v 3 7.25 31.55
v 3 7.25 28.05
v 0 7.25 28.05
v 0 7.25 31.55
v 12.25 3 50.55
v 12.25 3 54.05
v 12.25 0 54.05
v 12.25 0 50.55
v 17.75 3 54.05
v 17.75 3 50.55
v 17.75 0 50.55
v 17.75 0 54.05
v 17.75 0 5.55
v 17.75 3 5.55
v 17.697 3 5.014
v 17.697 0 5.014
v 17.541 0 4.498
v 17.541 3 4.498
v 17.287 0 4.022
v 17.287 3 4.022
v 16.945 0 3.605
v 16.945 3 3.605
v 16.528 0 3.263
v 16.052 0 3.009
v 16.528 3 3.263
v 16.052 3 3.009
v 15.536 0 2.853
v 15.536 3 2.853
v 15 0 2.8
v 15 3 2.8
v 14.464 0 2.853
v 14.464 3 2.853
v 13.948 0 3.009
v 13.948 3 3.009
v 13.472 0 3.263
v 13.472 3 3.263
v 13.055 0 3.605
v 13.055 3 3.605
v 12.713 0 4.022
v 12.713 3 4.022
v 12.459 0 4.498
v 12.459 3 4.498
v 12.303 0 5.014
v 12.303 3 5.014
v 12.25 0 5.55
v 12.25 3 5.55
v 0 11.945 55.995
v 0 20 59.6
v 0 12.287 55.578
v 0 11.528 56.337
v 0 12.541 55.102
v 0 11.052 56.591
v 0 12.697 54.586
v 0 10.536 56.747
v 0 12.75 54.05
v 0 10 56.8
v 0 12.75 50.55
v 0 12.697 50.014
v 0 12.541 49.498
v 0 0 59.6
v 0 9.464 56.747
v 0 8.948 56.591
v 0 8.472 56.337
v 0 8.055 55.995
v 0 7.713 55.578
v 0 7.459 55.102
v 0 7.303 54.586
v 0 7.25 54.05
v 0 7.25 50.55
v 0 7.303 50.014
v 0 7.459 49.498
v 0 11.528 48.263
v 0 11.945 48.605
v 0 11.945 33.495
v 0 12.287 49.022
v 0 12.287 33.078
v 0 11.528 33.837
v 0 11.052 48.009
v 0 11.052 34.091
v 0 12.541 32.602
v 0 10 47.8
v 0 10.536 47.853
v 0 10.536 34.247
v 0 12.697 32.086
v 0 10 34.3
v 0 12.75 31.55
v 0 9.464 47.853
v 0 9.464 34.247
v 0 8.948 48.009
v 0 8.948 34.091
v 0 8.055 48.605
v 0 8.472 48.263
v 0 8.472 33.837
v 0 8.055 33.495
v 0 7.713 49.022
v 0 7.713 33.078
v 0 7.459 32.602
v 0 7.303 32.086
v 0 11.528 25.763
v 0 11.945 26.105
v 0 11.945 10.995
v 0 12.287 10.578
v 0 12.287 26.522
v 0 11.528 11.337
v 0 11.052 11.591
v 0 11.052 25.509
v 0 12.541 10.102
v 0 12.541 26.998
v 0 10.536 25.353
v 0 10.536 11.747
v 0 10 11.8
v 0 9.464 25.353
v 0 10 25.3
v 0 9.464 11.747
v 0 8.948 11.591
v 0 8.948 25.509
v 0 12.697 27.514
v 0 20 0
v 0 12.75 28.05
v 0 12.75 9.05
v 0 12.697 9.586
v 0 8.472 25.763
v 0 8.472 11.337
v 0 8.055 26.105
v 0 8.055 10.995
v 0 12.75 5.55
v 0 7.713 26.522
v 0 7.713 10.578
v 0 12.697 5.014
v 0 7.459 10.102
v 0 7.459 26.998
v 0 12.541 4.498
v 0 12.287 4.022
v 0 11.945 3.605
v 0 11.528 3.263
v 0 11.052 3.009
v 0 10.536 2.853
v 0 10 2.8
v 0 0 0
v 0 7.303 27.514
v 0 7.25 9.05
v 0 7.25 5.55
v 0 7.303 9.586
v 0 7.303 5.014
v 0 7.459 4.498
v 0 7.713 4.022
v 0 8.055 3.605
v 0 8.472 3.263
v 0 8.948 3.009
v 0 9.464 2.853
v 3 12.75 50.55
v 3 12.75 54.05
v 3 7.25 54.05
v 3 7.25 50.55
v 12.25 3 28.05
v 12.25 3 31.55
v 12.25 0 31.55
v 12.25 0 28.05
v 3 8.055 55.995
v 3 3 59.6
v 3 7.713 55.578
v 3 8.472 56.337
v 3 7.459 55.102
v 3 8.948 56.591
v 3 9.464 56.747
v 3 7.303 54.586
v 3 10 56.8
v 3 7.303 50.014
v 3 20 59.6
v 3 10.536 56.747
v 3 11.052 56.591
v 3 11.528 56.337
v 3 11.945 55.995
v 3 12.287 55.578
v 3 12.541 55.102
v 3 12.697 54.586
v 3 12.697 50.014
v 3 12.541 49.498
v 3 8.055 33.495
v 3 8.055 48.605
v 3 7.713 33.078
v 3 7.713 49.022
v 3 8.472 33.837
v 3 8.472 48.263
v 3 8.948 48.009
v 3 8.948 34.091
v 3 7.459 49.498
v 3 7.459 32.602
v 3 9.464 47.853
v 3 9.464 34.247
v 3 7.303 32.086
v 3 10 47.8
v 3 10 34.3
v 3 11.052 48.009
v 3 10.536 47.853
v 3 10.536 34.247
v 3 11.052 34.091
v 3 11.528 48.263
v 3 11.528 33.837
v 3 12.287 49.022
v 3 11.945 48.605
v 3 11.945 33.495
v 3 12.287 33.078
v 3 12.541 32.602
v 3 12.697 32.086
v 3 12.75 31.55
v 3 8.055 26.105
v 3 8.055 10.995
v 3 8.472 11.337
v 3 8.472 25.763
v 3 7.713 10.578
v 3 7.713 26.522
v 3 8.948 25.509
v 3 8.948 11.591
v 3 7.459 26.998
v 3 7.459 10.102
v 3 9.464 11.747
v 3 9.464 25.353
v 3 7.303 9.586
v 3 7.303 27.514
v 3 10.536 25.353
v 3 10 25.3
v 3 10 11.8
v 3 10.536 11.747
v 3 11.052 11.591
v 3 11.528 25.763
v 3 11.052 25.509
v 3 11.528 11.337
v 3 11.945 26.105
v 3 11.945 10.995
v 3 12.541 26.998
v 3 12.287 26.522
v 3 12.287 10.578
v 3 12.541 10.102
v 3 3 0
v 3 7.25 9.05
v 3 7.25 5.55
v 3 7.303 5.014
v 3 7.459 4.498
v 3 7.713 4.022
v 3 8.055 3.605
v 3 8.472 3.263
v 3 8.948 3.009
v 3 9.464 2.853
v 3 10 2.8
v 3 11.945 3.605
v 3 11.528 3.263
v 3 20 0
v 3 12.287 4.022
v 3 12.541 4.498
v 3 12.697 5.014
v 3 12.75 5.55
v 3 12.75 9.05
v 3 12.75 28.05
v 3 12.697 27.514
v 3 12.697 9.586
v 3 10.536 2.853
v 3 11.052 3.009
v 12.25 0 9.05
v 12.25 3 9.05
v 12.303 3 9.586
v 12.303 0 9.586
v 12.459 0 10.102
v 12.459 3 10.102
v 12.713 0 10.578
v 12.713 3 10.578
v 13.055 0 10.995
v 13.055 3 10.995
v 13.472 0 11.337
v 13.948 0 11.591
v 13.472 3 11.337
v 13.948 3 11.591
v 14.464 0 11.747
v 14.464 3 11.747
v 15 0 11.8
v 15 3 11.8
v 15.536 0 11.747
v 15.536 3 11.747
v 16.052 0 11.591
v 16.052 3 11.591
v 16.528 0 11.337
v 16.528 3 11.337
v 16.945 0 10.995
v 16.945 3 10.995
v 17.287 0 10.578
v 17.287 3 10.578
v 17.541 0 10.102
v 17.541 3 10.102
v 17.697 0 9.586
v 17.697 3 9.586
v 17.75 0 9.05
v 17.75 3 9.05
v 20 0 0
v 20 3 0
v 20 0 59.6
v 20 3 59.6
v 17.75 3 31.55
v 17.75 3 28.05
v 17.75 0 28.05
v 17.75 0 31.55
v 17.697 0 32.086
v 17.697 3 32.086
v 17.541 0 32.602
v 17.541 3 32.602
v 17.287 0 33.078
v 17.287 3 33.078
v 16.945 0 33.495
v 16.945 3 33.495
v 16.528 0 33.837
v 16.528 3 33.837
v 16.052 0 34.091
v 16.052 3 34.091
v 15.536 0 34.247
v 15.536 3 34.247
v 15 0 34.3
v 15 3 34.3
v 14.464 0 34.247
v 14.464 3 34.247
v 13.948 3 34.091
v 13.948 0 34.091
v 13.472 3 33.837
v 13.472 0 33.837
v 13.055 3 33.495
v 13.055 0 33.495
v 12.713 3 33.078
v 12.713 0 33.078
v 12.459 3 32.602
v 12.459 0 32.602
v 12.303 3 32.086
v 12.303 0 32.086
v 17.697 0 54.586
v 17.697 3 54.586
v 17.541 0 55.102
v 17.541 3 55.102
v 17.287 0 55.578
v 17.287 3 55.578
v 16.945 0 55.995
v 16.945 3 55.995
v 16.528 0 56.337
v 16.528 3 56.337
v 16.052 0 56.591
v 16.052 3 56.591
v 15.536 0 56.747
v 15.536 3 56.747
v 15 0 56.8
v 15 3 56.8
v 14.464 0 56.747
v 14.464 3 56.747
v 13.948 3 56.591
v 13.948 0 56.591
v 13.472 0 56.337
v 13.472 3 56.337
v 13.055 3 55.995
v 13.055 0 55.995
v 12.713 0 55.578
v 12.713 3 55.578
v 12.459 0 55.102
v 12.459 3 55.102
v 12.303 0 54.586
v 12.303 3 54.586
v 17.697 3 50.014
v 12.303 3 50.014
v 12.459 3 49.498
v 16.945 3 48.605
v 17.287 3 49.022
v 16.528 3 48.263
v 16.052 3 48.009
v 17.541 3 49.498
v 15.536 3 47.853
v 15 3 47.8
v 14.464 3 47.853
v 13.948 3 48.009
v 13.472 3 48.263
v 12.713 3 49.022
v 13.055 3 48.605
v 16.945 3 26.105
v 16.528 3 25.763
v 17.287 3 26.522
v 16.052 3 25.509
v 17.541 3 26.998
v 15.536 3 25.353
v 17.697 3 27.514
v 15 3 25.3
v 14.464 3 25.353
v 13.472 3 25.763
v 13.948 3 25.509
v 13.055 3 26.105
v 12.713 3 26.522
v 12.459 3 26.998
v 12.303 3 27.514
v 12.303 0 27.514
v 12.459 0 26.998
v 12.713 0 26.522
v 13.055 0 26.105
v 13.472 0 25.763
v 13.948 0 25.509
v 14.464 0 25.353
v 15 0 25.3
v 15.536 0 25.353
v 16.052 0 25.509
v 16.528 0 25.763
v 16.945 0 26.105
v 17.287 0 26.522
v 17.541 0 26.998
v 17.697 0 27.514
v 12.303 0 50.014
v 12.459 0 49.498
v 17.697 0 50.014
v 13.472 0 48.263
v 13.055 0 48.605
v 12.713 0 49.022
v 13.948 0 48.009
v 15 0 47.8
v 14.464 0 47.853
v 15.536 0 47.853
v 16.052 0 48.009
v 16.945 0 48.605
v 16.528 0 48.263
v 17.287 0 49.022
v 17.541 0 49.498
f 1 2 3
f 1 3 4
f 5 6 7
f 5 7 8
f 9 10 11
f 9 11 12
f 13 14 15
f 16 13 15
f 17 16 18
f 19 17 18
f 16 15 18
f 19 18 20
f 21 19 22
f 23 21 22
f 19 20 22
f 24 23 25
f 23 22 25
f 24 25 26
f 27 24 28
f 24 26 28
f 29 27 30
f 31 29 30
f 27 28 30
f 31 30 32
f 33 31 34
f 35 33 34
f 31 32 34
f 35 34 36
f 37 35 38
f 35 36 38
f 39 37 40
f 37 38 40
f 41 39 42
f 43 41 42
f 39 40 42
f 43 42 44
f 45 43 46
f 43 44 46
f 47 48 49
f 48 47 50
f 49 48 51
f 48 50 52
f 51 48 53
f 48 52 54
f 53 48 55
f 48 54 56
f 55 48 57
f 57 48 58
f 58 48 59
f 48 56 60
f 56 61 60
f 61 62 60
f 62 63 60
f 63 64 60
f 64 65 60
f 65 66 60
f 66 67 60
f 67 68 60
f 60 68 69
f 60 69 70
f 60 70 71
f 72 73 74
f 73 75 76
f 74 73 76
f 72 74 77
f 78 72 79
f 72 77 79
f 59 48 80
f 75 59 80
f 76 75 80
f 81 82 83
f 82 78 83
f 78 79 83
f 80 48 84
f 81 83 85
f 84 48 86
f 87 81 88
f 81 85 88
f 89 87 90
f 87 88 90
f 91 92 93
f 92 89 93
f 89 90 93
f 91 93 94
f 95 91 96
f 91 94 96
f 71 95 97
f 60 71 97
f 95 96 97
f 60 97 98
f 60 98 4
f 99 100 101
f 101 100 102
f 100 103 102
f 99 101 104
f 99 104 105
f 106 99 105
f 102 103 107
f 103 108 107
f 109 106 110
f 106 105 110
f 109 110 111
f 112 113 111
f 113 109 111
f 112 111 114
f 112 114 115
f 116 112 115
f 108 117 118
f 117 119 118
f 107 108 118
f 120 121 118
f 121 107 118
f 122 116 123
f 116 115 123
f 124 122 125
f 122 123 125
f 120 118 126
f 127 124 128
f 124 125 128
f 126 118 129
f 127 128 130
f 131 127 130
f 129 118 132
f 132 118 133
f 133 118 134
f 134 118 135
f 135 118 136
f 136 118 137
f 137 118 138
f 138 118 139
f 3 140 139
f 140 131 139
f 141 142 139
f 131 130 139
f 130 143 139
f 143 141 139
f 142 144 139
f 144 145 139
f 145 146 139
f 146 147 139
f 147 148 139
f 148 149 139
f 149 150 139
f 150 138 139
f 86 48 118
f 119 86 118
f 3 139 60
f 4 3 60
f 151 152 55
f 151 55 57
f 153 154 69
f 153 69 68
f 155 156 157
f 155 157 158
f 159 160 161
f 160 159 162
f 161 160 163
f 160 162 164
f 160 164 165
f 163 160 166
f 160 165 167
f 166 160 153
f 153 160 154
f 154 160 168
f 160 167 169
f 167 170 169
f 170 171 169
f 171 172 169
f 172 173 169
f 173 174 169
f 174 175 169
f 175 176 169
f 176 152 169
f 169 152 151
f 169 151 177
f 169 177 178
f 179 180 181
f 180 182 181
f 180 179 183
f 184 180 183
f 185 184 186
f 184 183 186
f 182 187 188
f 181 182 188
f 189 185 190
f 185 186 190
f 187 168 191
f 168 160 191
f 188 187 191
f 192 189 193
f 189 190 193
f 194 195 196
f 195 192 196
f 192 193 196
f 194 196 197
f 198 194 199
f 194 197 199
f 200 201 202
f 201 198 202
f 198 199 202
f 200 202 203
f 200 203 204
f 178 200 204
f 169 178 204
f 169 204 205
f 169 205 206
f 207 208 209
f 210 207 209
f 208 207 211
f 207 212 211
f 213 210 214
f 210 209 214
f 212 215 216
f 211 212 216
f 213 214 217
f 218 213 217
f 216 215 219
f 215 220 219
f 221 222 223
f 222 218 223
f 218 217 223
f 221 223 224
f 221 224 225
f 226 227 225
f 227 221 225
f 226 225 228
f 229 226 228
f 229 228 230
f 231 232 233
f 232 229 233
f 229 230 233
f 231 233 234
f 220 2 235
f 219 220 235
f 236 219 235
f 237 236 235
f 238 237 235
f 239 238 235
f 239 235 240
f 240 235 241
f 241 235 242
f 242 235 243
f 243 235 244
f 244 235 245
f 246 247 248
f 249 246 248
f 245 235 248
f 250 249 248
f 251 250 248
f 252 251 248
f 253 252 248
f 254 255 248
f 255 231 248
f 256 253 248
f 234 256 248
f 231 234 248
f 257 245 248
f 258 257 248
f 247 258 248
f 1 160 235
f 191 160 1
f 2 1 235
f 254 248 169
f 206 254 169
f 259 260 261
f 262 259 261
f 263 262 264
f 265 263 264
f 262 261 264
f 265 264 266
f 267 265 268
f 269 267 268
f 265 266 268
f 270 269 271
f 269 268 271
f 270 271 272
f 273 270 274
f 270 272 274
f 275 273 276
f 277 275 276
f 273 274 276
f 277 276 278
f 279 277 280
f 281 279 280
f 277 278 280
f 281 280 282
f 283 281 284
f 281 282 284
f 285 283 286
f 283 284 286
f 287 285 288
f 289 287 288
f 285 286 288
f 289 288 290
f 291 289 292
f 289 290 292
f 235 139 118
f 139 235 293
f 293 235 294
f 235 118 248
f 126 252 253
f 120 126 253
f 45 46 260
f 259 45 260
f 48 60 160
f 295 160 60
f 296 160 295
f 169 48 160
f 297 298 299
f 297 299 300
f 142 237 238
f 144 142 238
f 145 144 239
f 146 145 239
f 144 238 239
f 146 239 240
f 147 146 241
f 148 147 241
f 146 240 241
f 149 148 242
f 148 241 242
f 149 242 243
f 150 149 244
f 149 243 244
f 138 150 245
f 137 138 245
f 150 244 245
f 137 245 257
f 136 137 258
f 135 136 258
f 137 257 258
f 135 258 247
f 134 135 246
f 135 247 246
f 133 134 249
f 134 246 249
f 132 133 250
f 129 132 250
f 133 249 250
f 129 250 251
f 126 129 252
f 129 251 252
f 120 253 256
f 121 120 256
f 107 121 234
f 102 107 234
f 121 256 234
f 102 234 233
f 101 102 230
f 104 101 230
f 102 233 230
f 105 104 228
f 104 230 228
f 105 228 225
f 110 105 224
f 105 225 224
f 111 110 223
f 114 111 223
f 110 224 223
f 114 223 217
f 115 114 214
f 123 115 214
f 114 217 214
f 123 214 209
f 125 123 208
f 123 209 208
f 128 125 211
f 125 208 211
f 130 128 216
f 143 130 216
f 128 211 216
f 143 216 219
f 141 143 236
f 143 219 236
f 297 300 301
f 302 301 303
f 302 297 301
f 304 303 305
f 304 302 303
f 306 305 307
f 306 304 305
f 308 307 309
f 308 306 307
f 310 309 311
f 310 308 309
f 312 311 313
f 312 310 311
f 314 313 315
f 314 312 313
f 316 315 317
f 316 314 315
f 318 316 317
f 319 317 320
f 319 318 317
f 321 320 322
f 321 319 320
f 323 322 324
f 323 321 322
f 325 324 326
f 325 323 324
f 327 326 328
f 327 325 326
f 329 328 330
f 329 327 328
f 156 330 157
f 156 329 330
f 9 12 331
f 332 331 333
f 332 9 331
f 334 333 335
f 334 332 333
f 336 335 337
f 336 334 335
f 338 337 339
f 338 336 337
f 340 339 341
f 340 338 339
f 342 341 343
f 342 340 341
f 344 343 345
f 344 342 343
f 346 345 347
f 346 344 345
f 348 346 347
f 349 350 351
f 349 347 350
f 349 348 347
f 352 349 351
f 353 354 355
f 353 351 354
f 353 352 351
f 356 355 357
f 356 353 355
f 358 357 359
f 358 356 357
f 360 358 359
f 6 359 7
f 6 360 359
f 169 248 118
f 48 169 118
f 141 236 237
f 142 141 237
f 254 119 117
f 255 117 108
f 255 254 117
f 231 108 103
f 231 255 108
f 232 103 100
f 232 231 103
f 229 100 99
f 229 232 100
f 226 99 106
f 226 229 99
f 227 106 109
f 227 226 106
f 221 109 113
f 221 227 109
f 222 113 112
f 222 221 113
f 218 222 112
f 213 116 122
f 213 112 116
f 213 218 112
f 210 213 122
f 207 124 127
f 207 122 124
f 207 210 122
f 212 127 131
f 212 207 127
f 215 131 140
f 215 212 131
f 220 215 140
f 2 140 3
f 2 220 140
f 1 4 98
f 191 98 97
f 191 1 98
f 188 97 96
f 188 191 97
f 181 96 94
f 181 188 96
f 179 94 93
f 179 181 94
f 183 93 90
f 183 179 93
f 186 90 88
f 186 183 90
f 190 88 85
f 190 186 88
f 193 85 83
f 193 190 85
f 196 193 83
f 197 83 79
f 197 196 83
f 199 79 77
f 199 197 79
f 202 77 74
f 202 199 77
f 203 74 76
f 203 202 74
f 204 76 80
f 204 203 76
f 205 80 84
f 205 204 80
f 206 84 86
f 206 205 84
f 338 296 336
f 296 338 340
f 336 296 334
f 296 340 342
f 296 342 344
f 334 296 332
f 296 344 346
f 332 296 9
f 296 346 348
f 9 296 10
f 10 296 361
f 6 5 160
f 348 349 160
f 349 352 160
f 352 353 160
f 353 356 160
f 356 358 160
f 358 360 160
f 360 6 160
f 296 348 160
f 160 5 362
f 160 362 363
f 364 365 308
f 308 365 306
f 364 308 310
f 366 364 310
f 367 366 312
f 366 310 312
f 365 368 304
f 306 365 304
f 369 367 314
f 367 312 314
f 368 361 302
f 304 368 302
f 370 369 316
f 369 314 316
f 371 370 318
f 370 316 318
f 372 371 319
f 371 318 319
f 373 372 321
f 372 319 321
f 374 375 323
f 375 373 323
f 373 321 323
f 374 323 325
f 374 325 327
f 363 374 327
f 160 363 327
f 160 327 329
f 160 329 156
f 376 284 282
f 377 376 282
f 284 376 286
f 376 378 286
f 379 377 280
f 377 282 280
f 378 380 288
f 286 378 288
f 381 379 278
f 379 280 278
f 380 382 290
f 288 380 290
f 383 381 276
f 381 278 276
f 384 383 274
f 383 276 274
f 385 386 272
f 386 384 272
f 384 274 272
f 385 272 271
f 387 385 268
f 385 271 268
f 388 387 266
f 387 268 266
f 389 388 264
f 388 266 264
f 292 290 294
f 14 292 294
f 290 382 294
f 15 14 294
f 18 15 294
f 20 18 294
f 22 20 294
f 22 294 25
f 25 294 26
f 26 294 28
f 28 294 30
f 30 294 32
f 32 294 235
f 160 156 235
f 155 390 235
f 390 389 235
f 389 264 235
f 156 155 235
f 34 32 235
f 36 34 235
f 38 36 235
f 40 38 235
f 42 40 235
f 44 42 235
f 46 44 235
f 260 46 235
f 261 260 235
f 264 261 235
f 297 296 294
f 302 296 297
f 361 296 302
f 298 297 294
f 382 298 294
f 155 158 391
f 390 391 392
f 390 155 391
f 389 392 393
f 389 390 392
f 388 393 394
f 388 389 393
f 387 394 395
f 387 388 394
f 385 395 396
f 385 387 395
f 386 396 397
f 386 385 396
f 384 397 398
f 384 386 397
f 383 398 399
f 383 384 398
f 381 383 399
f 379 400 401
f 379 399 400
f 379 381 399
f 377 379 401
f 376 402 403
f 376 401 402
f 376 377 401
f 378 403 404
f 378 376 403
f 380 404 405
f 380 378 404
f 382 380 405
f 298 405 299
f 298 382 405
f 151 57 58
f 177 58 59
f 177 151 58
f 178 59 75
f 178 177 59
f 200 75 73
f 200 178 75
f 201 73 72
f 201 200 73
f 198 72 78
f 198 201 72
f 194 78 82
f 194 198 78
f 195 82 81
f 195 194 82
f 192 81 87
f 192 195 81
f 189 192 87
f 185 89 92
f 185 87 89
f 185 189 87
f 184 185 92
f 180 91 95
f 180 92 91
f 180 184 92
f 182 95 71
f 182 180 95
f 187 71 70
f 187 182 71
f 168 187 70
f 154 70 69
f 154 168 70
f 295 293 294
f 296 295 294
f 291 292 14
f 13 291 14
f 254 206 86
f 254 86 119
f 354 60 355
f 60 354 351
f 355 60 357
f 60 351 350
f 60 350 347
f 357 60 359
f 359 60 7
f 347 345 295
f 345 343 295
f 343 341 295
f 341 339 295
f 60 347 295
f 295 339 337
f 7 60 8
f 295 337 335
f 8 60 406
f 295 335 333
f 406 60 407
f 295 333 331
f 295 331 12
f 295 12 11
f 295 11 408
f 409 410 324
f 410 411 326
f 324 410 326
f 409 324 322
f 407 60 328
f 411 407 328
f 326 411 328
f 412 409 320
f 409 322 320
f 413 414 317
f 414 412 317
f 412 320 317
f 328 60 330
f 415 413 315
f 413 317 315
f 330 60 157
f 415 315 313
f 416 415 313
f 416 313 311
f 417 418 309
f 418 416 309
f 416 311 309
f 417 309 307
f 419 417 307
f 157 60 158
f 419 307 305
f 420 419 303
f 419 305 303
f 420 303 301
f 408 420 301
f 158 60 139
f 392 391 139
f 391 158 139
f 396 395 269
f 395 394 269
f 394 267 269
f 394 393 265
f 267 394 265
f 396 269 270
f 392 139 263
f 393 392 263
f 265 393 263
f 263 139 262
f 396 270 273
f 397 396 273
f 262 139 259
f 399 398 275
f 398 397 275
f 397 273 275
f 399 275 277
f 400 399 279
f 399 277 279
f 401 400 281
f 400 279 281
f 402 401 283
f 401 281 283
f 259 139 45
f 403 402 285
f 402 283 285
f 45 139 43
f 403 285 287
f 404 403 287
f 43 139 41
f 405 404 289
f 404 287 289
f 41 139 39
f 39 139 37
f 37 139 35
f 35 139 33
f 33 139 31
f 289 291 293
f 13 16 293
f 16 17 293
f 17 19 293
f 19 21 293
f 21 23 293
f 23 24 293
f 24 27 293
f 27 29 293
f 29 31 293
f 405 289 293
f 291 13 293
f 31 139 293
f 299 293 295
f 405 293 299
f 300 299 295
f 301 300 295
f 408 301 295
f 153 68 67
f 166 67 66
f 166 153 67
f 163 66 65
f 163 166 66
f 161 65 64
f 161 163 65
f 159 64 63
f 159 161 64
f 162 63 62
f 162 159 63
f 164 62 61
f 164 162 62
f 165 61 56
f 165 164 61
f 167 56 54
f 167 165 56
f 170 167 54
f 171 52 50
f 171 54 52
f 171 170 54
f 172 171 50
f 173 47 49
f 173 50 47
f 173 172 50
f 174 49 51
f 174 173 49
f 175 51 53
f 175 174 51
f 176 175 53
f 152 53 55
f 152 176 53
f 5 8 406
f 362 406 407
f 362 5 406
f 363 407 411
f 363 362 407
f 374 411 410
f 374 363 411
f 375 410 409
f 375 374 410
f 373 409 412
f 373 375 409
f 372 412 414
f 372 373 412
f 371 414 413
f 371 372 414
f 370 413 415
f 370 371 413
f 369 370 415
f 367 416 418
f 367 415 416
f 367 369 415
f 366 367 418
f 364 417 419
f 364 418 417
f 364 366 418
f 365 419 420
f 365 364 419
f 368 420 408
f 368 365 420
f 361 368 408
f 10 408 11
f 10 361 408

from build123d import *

# Parameters (mm, degrees)
EXTRUDE_THIN1_DEPTH = 59.6
CUT_EXTRUDE1_DEPTH  = 4
CUT_EXTRUDE2_DEPTH  = 4


with BuildPart() as part:
    # Sketch1 → Extrude-Thin1 (new body)
    with BuildSketch(Plane.XY):
        Polygon((0, 20), (0, 0), (20, 0), (20, 3), (3, 3), (3, 20), align=None)
    extrude(amount=EXTRUDE_THIN1_DEPTH)

    # Sketch2 → Cut-Extrude1 (cut, through all)
    with BuildSketch(Plane(origin=(3, 0, 0), x_dir=(0, 0, -1), z_dir=(1, 0, 0))):
        with BuildLine():
            Line((-50.55, 7.25), (-54.05, 7.25))
            ThreePointArc((-54.05, 7.25), (-56.8, 10), (-54.05, 12.75))
            Line((-54.05, 12.75), (-50.55, 12.75))
            ThreePointArc((-50.55, 12.75), (-47.8, 10), (-50.55, 7.25))
        make_face()
        with BuildLine():
            Line((-9.05, 7.25), (-5.55, 7.25))
            ThreePointArc((-5.55, 7.25), (-2.8, 10), (-5.55, 12.75))
            Line((-5.55, 12.75), (-9.05, 12.75))
            ThreePointArc((-9.05, 12.75), (-11.8, 10), (-9.05, 7.25))
        make_face()
        with BuildLine():
            Line((-28.05, 7.25), (-31.55, 7.25))
            ThreePointArc((-31.55, 7.25), (-34.3, 10), (-31.55, 12.75))
            Line((-31.55, 12.75), (-28.05, 12.75))
            ThreePointArc((-28.05, 12.75), (-25.3, 10), (-28.05, 7.25))
        make_face()
    extrude(amount=-CUT_EXTRUDE1_DEPTH, mode=Mode.SUBTRACT)

    # Sketch3 → Cut-Extrude2 (cut, through all)
    with BuildSketch(Plane(origin=(0, 3, 0), x_dir=(1, 0, 0), z_dir=(0, 1, 0))):
        with BuildLine():
            Line((12.25, -54.05), (12.25, -50.55))
            ThreePointArc((12.25, -50.55), (15, -47.8), (17.75, -50.55))
            Line((17.75, -50.55), (17.75, -54.05))
            ThreePointArc((17.75, -54.05), (15, -56.8), (12.25, -54.05))
        make_face()
        with BuildLine():
            Line((12.25, -5.55), (12.25, -9.05))
            ThreePointArc((12.25, -9.05), (15, -11.8), (17.75, -9.05))
            Line((17.75, -9.05), (17.75, -5.55))
            ThreePointArc((17.75, -5.55), (15, -2.8), (12.25, -5.55))
        make_face()
        with BuildLine():
            Line((17.75, -28.05), (17.75, -31.55))
            ThreePointArc((17.75, -31.55), (15, -34.3), (12.25, -31.55))
            Line((12.25, -31.55), (12.25, -28.05))
            ThreePointArc((12.25, -28.05), (15, -25.3), (17.75, -28.05))
        make_face()
    extrude(amount=-CUT_EXTRUDE2_DEPTH, mode=Mode.SUBTRACT)


solid = part.part
